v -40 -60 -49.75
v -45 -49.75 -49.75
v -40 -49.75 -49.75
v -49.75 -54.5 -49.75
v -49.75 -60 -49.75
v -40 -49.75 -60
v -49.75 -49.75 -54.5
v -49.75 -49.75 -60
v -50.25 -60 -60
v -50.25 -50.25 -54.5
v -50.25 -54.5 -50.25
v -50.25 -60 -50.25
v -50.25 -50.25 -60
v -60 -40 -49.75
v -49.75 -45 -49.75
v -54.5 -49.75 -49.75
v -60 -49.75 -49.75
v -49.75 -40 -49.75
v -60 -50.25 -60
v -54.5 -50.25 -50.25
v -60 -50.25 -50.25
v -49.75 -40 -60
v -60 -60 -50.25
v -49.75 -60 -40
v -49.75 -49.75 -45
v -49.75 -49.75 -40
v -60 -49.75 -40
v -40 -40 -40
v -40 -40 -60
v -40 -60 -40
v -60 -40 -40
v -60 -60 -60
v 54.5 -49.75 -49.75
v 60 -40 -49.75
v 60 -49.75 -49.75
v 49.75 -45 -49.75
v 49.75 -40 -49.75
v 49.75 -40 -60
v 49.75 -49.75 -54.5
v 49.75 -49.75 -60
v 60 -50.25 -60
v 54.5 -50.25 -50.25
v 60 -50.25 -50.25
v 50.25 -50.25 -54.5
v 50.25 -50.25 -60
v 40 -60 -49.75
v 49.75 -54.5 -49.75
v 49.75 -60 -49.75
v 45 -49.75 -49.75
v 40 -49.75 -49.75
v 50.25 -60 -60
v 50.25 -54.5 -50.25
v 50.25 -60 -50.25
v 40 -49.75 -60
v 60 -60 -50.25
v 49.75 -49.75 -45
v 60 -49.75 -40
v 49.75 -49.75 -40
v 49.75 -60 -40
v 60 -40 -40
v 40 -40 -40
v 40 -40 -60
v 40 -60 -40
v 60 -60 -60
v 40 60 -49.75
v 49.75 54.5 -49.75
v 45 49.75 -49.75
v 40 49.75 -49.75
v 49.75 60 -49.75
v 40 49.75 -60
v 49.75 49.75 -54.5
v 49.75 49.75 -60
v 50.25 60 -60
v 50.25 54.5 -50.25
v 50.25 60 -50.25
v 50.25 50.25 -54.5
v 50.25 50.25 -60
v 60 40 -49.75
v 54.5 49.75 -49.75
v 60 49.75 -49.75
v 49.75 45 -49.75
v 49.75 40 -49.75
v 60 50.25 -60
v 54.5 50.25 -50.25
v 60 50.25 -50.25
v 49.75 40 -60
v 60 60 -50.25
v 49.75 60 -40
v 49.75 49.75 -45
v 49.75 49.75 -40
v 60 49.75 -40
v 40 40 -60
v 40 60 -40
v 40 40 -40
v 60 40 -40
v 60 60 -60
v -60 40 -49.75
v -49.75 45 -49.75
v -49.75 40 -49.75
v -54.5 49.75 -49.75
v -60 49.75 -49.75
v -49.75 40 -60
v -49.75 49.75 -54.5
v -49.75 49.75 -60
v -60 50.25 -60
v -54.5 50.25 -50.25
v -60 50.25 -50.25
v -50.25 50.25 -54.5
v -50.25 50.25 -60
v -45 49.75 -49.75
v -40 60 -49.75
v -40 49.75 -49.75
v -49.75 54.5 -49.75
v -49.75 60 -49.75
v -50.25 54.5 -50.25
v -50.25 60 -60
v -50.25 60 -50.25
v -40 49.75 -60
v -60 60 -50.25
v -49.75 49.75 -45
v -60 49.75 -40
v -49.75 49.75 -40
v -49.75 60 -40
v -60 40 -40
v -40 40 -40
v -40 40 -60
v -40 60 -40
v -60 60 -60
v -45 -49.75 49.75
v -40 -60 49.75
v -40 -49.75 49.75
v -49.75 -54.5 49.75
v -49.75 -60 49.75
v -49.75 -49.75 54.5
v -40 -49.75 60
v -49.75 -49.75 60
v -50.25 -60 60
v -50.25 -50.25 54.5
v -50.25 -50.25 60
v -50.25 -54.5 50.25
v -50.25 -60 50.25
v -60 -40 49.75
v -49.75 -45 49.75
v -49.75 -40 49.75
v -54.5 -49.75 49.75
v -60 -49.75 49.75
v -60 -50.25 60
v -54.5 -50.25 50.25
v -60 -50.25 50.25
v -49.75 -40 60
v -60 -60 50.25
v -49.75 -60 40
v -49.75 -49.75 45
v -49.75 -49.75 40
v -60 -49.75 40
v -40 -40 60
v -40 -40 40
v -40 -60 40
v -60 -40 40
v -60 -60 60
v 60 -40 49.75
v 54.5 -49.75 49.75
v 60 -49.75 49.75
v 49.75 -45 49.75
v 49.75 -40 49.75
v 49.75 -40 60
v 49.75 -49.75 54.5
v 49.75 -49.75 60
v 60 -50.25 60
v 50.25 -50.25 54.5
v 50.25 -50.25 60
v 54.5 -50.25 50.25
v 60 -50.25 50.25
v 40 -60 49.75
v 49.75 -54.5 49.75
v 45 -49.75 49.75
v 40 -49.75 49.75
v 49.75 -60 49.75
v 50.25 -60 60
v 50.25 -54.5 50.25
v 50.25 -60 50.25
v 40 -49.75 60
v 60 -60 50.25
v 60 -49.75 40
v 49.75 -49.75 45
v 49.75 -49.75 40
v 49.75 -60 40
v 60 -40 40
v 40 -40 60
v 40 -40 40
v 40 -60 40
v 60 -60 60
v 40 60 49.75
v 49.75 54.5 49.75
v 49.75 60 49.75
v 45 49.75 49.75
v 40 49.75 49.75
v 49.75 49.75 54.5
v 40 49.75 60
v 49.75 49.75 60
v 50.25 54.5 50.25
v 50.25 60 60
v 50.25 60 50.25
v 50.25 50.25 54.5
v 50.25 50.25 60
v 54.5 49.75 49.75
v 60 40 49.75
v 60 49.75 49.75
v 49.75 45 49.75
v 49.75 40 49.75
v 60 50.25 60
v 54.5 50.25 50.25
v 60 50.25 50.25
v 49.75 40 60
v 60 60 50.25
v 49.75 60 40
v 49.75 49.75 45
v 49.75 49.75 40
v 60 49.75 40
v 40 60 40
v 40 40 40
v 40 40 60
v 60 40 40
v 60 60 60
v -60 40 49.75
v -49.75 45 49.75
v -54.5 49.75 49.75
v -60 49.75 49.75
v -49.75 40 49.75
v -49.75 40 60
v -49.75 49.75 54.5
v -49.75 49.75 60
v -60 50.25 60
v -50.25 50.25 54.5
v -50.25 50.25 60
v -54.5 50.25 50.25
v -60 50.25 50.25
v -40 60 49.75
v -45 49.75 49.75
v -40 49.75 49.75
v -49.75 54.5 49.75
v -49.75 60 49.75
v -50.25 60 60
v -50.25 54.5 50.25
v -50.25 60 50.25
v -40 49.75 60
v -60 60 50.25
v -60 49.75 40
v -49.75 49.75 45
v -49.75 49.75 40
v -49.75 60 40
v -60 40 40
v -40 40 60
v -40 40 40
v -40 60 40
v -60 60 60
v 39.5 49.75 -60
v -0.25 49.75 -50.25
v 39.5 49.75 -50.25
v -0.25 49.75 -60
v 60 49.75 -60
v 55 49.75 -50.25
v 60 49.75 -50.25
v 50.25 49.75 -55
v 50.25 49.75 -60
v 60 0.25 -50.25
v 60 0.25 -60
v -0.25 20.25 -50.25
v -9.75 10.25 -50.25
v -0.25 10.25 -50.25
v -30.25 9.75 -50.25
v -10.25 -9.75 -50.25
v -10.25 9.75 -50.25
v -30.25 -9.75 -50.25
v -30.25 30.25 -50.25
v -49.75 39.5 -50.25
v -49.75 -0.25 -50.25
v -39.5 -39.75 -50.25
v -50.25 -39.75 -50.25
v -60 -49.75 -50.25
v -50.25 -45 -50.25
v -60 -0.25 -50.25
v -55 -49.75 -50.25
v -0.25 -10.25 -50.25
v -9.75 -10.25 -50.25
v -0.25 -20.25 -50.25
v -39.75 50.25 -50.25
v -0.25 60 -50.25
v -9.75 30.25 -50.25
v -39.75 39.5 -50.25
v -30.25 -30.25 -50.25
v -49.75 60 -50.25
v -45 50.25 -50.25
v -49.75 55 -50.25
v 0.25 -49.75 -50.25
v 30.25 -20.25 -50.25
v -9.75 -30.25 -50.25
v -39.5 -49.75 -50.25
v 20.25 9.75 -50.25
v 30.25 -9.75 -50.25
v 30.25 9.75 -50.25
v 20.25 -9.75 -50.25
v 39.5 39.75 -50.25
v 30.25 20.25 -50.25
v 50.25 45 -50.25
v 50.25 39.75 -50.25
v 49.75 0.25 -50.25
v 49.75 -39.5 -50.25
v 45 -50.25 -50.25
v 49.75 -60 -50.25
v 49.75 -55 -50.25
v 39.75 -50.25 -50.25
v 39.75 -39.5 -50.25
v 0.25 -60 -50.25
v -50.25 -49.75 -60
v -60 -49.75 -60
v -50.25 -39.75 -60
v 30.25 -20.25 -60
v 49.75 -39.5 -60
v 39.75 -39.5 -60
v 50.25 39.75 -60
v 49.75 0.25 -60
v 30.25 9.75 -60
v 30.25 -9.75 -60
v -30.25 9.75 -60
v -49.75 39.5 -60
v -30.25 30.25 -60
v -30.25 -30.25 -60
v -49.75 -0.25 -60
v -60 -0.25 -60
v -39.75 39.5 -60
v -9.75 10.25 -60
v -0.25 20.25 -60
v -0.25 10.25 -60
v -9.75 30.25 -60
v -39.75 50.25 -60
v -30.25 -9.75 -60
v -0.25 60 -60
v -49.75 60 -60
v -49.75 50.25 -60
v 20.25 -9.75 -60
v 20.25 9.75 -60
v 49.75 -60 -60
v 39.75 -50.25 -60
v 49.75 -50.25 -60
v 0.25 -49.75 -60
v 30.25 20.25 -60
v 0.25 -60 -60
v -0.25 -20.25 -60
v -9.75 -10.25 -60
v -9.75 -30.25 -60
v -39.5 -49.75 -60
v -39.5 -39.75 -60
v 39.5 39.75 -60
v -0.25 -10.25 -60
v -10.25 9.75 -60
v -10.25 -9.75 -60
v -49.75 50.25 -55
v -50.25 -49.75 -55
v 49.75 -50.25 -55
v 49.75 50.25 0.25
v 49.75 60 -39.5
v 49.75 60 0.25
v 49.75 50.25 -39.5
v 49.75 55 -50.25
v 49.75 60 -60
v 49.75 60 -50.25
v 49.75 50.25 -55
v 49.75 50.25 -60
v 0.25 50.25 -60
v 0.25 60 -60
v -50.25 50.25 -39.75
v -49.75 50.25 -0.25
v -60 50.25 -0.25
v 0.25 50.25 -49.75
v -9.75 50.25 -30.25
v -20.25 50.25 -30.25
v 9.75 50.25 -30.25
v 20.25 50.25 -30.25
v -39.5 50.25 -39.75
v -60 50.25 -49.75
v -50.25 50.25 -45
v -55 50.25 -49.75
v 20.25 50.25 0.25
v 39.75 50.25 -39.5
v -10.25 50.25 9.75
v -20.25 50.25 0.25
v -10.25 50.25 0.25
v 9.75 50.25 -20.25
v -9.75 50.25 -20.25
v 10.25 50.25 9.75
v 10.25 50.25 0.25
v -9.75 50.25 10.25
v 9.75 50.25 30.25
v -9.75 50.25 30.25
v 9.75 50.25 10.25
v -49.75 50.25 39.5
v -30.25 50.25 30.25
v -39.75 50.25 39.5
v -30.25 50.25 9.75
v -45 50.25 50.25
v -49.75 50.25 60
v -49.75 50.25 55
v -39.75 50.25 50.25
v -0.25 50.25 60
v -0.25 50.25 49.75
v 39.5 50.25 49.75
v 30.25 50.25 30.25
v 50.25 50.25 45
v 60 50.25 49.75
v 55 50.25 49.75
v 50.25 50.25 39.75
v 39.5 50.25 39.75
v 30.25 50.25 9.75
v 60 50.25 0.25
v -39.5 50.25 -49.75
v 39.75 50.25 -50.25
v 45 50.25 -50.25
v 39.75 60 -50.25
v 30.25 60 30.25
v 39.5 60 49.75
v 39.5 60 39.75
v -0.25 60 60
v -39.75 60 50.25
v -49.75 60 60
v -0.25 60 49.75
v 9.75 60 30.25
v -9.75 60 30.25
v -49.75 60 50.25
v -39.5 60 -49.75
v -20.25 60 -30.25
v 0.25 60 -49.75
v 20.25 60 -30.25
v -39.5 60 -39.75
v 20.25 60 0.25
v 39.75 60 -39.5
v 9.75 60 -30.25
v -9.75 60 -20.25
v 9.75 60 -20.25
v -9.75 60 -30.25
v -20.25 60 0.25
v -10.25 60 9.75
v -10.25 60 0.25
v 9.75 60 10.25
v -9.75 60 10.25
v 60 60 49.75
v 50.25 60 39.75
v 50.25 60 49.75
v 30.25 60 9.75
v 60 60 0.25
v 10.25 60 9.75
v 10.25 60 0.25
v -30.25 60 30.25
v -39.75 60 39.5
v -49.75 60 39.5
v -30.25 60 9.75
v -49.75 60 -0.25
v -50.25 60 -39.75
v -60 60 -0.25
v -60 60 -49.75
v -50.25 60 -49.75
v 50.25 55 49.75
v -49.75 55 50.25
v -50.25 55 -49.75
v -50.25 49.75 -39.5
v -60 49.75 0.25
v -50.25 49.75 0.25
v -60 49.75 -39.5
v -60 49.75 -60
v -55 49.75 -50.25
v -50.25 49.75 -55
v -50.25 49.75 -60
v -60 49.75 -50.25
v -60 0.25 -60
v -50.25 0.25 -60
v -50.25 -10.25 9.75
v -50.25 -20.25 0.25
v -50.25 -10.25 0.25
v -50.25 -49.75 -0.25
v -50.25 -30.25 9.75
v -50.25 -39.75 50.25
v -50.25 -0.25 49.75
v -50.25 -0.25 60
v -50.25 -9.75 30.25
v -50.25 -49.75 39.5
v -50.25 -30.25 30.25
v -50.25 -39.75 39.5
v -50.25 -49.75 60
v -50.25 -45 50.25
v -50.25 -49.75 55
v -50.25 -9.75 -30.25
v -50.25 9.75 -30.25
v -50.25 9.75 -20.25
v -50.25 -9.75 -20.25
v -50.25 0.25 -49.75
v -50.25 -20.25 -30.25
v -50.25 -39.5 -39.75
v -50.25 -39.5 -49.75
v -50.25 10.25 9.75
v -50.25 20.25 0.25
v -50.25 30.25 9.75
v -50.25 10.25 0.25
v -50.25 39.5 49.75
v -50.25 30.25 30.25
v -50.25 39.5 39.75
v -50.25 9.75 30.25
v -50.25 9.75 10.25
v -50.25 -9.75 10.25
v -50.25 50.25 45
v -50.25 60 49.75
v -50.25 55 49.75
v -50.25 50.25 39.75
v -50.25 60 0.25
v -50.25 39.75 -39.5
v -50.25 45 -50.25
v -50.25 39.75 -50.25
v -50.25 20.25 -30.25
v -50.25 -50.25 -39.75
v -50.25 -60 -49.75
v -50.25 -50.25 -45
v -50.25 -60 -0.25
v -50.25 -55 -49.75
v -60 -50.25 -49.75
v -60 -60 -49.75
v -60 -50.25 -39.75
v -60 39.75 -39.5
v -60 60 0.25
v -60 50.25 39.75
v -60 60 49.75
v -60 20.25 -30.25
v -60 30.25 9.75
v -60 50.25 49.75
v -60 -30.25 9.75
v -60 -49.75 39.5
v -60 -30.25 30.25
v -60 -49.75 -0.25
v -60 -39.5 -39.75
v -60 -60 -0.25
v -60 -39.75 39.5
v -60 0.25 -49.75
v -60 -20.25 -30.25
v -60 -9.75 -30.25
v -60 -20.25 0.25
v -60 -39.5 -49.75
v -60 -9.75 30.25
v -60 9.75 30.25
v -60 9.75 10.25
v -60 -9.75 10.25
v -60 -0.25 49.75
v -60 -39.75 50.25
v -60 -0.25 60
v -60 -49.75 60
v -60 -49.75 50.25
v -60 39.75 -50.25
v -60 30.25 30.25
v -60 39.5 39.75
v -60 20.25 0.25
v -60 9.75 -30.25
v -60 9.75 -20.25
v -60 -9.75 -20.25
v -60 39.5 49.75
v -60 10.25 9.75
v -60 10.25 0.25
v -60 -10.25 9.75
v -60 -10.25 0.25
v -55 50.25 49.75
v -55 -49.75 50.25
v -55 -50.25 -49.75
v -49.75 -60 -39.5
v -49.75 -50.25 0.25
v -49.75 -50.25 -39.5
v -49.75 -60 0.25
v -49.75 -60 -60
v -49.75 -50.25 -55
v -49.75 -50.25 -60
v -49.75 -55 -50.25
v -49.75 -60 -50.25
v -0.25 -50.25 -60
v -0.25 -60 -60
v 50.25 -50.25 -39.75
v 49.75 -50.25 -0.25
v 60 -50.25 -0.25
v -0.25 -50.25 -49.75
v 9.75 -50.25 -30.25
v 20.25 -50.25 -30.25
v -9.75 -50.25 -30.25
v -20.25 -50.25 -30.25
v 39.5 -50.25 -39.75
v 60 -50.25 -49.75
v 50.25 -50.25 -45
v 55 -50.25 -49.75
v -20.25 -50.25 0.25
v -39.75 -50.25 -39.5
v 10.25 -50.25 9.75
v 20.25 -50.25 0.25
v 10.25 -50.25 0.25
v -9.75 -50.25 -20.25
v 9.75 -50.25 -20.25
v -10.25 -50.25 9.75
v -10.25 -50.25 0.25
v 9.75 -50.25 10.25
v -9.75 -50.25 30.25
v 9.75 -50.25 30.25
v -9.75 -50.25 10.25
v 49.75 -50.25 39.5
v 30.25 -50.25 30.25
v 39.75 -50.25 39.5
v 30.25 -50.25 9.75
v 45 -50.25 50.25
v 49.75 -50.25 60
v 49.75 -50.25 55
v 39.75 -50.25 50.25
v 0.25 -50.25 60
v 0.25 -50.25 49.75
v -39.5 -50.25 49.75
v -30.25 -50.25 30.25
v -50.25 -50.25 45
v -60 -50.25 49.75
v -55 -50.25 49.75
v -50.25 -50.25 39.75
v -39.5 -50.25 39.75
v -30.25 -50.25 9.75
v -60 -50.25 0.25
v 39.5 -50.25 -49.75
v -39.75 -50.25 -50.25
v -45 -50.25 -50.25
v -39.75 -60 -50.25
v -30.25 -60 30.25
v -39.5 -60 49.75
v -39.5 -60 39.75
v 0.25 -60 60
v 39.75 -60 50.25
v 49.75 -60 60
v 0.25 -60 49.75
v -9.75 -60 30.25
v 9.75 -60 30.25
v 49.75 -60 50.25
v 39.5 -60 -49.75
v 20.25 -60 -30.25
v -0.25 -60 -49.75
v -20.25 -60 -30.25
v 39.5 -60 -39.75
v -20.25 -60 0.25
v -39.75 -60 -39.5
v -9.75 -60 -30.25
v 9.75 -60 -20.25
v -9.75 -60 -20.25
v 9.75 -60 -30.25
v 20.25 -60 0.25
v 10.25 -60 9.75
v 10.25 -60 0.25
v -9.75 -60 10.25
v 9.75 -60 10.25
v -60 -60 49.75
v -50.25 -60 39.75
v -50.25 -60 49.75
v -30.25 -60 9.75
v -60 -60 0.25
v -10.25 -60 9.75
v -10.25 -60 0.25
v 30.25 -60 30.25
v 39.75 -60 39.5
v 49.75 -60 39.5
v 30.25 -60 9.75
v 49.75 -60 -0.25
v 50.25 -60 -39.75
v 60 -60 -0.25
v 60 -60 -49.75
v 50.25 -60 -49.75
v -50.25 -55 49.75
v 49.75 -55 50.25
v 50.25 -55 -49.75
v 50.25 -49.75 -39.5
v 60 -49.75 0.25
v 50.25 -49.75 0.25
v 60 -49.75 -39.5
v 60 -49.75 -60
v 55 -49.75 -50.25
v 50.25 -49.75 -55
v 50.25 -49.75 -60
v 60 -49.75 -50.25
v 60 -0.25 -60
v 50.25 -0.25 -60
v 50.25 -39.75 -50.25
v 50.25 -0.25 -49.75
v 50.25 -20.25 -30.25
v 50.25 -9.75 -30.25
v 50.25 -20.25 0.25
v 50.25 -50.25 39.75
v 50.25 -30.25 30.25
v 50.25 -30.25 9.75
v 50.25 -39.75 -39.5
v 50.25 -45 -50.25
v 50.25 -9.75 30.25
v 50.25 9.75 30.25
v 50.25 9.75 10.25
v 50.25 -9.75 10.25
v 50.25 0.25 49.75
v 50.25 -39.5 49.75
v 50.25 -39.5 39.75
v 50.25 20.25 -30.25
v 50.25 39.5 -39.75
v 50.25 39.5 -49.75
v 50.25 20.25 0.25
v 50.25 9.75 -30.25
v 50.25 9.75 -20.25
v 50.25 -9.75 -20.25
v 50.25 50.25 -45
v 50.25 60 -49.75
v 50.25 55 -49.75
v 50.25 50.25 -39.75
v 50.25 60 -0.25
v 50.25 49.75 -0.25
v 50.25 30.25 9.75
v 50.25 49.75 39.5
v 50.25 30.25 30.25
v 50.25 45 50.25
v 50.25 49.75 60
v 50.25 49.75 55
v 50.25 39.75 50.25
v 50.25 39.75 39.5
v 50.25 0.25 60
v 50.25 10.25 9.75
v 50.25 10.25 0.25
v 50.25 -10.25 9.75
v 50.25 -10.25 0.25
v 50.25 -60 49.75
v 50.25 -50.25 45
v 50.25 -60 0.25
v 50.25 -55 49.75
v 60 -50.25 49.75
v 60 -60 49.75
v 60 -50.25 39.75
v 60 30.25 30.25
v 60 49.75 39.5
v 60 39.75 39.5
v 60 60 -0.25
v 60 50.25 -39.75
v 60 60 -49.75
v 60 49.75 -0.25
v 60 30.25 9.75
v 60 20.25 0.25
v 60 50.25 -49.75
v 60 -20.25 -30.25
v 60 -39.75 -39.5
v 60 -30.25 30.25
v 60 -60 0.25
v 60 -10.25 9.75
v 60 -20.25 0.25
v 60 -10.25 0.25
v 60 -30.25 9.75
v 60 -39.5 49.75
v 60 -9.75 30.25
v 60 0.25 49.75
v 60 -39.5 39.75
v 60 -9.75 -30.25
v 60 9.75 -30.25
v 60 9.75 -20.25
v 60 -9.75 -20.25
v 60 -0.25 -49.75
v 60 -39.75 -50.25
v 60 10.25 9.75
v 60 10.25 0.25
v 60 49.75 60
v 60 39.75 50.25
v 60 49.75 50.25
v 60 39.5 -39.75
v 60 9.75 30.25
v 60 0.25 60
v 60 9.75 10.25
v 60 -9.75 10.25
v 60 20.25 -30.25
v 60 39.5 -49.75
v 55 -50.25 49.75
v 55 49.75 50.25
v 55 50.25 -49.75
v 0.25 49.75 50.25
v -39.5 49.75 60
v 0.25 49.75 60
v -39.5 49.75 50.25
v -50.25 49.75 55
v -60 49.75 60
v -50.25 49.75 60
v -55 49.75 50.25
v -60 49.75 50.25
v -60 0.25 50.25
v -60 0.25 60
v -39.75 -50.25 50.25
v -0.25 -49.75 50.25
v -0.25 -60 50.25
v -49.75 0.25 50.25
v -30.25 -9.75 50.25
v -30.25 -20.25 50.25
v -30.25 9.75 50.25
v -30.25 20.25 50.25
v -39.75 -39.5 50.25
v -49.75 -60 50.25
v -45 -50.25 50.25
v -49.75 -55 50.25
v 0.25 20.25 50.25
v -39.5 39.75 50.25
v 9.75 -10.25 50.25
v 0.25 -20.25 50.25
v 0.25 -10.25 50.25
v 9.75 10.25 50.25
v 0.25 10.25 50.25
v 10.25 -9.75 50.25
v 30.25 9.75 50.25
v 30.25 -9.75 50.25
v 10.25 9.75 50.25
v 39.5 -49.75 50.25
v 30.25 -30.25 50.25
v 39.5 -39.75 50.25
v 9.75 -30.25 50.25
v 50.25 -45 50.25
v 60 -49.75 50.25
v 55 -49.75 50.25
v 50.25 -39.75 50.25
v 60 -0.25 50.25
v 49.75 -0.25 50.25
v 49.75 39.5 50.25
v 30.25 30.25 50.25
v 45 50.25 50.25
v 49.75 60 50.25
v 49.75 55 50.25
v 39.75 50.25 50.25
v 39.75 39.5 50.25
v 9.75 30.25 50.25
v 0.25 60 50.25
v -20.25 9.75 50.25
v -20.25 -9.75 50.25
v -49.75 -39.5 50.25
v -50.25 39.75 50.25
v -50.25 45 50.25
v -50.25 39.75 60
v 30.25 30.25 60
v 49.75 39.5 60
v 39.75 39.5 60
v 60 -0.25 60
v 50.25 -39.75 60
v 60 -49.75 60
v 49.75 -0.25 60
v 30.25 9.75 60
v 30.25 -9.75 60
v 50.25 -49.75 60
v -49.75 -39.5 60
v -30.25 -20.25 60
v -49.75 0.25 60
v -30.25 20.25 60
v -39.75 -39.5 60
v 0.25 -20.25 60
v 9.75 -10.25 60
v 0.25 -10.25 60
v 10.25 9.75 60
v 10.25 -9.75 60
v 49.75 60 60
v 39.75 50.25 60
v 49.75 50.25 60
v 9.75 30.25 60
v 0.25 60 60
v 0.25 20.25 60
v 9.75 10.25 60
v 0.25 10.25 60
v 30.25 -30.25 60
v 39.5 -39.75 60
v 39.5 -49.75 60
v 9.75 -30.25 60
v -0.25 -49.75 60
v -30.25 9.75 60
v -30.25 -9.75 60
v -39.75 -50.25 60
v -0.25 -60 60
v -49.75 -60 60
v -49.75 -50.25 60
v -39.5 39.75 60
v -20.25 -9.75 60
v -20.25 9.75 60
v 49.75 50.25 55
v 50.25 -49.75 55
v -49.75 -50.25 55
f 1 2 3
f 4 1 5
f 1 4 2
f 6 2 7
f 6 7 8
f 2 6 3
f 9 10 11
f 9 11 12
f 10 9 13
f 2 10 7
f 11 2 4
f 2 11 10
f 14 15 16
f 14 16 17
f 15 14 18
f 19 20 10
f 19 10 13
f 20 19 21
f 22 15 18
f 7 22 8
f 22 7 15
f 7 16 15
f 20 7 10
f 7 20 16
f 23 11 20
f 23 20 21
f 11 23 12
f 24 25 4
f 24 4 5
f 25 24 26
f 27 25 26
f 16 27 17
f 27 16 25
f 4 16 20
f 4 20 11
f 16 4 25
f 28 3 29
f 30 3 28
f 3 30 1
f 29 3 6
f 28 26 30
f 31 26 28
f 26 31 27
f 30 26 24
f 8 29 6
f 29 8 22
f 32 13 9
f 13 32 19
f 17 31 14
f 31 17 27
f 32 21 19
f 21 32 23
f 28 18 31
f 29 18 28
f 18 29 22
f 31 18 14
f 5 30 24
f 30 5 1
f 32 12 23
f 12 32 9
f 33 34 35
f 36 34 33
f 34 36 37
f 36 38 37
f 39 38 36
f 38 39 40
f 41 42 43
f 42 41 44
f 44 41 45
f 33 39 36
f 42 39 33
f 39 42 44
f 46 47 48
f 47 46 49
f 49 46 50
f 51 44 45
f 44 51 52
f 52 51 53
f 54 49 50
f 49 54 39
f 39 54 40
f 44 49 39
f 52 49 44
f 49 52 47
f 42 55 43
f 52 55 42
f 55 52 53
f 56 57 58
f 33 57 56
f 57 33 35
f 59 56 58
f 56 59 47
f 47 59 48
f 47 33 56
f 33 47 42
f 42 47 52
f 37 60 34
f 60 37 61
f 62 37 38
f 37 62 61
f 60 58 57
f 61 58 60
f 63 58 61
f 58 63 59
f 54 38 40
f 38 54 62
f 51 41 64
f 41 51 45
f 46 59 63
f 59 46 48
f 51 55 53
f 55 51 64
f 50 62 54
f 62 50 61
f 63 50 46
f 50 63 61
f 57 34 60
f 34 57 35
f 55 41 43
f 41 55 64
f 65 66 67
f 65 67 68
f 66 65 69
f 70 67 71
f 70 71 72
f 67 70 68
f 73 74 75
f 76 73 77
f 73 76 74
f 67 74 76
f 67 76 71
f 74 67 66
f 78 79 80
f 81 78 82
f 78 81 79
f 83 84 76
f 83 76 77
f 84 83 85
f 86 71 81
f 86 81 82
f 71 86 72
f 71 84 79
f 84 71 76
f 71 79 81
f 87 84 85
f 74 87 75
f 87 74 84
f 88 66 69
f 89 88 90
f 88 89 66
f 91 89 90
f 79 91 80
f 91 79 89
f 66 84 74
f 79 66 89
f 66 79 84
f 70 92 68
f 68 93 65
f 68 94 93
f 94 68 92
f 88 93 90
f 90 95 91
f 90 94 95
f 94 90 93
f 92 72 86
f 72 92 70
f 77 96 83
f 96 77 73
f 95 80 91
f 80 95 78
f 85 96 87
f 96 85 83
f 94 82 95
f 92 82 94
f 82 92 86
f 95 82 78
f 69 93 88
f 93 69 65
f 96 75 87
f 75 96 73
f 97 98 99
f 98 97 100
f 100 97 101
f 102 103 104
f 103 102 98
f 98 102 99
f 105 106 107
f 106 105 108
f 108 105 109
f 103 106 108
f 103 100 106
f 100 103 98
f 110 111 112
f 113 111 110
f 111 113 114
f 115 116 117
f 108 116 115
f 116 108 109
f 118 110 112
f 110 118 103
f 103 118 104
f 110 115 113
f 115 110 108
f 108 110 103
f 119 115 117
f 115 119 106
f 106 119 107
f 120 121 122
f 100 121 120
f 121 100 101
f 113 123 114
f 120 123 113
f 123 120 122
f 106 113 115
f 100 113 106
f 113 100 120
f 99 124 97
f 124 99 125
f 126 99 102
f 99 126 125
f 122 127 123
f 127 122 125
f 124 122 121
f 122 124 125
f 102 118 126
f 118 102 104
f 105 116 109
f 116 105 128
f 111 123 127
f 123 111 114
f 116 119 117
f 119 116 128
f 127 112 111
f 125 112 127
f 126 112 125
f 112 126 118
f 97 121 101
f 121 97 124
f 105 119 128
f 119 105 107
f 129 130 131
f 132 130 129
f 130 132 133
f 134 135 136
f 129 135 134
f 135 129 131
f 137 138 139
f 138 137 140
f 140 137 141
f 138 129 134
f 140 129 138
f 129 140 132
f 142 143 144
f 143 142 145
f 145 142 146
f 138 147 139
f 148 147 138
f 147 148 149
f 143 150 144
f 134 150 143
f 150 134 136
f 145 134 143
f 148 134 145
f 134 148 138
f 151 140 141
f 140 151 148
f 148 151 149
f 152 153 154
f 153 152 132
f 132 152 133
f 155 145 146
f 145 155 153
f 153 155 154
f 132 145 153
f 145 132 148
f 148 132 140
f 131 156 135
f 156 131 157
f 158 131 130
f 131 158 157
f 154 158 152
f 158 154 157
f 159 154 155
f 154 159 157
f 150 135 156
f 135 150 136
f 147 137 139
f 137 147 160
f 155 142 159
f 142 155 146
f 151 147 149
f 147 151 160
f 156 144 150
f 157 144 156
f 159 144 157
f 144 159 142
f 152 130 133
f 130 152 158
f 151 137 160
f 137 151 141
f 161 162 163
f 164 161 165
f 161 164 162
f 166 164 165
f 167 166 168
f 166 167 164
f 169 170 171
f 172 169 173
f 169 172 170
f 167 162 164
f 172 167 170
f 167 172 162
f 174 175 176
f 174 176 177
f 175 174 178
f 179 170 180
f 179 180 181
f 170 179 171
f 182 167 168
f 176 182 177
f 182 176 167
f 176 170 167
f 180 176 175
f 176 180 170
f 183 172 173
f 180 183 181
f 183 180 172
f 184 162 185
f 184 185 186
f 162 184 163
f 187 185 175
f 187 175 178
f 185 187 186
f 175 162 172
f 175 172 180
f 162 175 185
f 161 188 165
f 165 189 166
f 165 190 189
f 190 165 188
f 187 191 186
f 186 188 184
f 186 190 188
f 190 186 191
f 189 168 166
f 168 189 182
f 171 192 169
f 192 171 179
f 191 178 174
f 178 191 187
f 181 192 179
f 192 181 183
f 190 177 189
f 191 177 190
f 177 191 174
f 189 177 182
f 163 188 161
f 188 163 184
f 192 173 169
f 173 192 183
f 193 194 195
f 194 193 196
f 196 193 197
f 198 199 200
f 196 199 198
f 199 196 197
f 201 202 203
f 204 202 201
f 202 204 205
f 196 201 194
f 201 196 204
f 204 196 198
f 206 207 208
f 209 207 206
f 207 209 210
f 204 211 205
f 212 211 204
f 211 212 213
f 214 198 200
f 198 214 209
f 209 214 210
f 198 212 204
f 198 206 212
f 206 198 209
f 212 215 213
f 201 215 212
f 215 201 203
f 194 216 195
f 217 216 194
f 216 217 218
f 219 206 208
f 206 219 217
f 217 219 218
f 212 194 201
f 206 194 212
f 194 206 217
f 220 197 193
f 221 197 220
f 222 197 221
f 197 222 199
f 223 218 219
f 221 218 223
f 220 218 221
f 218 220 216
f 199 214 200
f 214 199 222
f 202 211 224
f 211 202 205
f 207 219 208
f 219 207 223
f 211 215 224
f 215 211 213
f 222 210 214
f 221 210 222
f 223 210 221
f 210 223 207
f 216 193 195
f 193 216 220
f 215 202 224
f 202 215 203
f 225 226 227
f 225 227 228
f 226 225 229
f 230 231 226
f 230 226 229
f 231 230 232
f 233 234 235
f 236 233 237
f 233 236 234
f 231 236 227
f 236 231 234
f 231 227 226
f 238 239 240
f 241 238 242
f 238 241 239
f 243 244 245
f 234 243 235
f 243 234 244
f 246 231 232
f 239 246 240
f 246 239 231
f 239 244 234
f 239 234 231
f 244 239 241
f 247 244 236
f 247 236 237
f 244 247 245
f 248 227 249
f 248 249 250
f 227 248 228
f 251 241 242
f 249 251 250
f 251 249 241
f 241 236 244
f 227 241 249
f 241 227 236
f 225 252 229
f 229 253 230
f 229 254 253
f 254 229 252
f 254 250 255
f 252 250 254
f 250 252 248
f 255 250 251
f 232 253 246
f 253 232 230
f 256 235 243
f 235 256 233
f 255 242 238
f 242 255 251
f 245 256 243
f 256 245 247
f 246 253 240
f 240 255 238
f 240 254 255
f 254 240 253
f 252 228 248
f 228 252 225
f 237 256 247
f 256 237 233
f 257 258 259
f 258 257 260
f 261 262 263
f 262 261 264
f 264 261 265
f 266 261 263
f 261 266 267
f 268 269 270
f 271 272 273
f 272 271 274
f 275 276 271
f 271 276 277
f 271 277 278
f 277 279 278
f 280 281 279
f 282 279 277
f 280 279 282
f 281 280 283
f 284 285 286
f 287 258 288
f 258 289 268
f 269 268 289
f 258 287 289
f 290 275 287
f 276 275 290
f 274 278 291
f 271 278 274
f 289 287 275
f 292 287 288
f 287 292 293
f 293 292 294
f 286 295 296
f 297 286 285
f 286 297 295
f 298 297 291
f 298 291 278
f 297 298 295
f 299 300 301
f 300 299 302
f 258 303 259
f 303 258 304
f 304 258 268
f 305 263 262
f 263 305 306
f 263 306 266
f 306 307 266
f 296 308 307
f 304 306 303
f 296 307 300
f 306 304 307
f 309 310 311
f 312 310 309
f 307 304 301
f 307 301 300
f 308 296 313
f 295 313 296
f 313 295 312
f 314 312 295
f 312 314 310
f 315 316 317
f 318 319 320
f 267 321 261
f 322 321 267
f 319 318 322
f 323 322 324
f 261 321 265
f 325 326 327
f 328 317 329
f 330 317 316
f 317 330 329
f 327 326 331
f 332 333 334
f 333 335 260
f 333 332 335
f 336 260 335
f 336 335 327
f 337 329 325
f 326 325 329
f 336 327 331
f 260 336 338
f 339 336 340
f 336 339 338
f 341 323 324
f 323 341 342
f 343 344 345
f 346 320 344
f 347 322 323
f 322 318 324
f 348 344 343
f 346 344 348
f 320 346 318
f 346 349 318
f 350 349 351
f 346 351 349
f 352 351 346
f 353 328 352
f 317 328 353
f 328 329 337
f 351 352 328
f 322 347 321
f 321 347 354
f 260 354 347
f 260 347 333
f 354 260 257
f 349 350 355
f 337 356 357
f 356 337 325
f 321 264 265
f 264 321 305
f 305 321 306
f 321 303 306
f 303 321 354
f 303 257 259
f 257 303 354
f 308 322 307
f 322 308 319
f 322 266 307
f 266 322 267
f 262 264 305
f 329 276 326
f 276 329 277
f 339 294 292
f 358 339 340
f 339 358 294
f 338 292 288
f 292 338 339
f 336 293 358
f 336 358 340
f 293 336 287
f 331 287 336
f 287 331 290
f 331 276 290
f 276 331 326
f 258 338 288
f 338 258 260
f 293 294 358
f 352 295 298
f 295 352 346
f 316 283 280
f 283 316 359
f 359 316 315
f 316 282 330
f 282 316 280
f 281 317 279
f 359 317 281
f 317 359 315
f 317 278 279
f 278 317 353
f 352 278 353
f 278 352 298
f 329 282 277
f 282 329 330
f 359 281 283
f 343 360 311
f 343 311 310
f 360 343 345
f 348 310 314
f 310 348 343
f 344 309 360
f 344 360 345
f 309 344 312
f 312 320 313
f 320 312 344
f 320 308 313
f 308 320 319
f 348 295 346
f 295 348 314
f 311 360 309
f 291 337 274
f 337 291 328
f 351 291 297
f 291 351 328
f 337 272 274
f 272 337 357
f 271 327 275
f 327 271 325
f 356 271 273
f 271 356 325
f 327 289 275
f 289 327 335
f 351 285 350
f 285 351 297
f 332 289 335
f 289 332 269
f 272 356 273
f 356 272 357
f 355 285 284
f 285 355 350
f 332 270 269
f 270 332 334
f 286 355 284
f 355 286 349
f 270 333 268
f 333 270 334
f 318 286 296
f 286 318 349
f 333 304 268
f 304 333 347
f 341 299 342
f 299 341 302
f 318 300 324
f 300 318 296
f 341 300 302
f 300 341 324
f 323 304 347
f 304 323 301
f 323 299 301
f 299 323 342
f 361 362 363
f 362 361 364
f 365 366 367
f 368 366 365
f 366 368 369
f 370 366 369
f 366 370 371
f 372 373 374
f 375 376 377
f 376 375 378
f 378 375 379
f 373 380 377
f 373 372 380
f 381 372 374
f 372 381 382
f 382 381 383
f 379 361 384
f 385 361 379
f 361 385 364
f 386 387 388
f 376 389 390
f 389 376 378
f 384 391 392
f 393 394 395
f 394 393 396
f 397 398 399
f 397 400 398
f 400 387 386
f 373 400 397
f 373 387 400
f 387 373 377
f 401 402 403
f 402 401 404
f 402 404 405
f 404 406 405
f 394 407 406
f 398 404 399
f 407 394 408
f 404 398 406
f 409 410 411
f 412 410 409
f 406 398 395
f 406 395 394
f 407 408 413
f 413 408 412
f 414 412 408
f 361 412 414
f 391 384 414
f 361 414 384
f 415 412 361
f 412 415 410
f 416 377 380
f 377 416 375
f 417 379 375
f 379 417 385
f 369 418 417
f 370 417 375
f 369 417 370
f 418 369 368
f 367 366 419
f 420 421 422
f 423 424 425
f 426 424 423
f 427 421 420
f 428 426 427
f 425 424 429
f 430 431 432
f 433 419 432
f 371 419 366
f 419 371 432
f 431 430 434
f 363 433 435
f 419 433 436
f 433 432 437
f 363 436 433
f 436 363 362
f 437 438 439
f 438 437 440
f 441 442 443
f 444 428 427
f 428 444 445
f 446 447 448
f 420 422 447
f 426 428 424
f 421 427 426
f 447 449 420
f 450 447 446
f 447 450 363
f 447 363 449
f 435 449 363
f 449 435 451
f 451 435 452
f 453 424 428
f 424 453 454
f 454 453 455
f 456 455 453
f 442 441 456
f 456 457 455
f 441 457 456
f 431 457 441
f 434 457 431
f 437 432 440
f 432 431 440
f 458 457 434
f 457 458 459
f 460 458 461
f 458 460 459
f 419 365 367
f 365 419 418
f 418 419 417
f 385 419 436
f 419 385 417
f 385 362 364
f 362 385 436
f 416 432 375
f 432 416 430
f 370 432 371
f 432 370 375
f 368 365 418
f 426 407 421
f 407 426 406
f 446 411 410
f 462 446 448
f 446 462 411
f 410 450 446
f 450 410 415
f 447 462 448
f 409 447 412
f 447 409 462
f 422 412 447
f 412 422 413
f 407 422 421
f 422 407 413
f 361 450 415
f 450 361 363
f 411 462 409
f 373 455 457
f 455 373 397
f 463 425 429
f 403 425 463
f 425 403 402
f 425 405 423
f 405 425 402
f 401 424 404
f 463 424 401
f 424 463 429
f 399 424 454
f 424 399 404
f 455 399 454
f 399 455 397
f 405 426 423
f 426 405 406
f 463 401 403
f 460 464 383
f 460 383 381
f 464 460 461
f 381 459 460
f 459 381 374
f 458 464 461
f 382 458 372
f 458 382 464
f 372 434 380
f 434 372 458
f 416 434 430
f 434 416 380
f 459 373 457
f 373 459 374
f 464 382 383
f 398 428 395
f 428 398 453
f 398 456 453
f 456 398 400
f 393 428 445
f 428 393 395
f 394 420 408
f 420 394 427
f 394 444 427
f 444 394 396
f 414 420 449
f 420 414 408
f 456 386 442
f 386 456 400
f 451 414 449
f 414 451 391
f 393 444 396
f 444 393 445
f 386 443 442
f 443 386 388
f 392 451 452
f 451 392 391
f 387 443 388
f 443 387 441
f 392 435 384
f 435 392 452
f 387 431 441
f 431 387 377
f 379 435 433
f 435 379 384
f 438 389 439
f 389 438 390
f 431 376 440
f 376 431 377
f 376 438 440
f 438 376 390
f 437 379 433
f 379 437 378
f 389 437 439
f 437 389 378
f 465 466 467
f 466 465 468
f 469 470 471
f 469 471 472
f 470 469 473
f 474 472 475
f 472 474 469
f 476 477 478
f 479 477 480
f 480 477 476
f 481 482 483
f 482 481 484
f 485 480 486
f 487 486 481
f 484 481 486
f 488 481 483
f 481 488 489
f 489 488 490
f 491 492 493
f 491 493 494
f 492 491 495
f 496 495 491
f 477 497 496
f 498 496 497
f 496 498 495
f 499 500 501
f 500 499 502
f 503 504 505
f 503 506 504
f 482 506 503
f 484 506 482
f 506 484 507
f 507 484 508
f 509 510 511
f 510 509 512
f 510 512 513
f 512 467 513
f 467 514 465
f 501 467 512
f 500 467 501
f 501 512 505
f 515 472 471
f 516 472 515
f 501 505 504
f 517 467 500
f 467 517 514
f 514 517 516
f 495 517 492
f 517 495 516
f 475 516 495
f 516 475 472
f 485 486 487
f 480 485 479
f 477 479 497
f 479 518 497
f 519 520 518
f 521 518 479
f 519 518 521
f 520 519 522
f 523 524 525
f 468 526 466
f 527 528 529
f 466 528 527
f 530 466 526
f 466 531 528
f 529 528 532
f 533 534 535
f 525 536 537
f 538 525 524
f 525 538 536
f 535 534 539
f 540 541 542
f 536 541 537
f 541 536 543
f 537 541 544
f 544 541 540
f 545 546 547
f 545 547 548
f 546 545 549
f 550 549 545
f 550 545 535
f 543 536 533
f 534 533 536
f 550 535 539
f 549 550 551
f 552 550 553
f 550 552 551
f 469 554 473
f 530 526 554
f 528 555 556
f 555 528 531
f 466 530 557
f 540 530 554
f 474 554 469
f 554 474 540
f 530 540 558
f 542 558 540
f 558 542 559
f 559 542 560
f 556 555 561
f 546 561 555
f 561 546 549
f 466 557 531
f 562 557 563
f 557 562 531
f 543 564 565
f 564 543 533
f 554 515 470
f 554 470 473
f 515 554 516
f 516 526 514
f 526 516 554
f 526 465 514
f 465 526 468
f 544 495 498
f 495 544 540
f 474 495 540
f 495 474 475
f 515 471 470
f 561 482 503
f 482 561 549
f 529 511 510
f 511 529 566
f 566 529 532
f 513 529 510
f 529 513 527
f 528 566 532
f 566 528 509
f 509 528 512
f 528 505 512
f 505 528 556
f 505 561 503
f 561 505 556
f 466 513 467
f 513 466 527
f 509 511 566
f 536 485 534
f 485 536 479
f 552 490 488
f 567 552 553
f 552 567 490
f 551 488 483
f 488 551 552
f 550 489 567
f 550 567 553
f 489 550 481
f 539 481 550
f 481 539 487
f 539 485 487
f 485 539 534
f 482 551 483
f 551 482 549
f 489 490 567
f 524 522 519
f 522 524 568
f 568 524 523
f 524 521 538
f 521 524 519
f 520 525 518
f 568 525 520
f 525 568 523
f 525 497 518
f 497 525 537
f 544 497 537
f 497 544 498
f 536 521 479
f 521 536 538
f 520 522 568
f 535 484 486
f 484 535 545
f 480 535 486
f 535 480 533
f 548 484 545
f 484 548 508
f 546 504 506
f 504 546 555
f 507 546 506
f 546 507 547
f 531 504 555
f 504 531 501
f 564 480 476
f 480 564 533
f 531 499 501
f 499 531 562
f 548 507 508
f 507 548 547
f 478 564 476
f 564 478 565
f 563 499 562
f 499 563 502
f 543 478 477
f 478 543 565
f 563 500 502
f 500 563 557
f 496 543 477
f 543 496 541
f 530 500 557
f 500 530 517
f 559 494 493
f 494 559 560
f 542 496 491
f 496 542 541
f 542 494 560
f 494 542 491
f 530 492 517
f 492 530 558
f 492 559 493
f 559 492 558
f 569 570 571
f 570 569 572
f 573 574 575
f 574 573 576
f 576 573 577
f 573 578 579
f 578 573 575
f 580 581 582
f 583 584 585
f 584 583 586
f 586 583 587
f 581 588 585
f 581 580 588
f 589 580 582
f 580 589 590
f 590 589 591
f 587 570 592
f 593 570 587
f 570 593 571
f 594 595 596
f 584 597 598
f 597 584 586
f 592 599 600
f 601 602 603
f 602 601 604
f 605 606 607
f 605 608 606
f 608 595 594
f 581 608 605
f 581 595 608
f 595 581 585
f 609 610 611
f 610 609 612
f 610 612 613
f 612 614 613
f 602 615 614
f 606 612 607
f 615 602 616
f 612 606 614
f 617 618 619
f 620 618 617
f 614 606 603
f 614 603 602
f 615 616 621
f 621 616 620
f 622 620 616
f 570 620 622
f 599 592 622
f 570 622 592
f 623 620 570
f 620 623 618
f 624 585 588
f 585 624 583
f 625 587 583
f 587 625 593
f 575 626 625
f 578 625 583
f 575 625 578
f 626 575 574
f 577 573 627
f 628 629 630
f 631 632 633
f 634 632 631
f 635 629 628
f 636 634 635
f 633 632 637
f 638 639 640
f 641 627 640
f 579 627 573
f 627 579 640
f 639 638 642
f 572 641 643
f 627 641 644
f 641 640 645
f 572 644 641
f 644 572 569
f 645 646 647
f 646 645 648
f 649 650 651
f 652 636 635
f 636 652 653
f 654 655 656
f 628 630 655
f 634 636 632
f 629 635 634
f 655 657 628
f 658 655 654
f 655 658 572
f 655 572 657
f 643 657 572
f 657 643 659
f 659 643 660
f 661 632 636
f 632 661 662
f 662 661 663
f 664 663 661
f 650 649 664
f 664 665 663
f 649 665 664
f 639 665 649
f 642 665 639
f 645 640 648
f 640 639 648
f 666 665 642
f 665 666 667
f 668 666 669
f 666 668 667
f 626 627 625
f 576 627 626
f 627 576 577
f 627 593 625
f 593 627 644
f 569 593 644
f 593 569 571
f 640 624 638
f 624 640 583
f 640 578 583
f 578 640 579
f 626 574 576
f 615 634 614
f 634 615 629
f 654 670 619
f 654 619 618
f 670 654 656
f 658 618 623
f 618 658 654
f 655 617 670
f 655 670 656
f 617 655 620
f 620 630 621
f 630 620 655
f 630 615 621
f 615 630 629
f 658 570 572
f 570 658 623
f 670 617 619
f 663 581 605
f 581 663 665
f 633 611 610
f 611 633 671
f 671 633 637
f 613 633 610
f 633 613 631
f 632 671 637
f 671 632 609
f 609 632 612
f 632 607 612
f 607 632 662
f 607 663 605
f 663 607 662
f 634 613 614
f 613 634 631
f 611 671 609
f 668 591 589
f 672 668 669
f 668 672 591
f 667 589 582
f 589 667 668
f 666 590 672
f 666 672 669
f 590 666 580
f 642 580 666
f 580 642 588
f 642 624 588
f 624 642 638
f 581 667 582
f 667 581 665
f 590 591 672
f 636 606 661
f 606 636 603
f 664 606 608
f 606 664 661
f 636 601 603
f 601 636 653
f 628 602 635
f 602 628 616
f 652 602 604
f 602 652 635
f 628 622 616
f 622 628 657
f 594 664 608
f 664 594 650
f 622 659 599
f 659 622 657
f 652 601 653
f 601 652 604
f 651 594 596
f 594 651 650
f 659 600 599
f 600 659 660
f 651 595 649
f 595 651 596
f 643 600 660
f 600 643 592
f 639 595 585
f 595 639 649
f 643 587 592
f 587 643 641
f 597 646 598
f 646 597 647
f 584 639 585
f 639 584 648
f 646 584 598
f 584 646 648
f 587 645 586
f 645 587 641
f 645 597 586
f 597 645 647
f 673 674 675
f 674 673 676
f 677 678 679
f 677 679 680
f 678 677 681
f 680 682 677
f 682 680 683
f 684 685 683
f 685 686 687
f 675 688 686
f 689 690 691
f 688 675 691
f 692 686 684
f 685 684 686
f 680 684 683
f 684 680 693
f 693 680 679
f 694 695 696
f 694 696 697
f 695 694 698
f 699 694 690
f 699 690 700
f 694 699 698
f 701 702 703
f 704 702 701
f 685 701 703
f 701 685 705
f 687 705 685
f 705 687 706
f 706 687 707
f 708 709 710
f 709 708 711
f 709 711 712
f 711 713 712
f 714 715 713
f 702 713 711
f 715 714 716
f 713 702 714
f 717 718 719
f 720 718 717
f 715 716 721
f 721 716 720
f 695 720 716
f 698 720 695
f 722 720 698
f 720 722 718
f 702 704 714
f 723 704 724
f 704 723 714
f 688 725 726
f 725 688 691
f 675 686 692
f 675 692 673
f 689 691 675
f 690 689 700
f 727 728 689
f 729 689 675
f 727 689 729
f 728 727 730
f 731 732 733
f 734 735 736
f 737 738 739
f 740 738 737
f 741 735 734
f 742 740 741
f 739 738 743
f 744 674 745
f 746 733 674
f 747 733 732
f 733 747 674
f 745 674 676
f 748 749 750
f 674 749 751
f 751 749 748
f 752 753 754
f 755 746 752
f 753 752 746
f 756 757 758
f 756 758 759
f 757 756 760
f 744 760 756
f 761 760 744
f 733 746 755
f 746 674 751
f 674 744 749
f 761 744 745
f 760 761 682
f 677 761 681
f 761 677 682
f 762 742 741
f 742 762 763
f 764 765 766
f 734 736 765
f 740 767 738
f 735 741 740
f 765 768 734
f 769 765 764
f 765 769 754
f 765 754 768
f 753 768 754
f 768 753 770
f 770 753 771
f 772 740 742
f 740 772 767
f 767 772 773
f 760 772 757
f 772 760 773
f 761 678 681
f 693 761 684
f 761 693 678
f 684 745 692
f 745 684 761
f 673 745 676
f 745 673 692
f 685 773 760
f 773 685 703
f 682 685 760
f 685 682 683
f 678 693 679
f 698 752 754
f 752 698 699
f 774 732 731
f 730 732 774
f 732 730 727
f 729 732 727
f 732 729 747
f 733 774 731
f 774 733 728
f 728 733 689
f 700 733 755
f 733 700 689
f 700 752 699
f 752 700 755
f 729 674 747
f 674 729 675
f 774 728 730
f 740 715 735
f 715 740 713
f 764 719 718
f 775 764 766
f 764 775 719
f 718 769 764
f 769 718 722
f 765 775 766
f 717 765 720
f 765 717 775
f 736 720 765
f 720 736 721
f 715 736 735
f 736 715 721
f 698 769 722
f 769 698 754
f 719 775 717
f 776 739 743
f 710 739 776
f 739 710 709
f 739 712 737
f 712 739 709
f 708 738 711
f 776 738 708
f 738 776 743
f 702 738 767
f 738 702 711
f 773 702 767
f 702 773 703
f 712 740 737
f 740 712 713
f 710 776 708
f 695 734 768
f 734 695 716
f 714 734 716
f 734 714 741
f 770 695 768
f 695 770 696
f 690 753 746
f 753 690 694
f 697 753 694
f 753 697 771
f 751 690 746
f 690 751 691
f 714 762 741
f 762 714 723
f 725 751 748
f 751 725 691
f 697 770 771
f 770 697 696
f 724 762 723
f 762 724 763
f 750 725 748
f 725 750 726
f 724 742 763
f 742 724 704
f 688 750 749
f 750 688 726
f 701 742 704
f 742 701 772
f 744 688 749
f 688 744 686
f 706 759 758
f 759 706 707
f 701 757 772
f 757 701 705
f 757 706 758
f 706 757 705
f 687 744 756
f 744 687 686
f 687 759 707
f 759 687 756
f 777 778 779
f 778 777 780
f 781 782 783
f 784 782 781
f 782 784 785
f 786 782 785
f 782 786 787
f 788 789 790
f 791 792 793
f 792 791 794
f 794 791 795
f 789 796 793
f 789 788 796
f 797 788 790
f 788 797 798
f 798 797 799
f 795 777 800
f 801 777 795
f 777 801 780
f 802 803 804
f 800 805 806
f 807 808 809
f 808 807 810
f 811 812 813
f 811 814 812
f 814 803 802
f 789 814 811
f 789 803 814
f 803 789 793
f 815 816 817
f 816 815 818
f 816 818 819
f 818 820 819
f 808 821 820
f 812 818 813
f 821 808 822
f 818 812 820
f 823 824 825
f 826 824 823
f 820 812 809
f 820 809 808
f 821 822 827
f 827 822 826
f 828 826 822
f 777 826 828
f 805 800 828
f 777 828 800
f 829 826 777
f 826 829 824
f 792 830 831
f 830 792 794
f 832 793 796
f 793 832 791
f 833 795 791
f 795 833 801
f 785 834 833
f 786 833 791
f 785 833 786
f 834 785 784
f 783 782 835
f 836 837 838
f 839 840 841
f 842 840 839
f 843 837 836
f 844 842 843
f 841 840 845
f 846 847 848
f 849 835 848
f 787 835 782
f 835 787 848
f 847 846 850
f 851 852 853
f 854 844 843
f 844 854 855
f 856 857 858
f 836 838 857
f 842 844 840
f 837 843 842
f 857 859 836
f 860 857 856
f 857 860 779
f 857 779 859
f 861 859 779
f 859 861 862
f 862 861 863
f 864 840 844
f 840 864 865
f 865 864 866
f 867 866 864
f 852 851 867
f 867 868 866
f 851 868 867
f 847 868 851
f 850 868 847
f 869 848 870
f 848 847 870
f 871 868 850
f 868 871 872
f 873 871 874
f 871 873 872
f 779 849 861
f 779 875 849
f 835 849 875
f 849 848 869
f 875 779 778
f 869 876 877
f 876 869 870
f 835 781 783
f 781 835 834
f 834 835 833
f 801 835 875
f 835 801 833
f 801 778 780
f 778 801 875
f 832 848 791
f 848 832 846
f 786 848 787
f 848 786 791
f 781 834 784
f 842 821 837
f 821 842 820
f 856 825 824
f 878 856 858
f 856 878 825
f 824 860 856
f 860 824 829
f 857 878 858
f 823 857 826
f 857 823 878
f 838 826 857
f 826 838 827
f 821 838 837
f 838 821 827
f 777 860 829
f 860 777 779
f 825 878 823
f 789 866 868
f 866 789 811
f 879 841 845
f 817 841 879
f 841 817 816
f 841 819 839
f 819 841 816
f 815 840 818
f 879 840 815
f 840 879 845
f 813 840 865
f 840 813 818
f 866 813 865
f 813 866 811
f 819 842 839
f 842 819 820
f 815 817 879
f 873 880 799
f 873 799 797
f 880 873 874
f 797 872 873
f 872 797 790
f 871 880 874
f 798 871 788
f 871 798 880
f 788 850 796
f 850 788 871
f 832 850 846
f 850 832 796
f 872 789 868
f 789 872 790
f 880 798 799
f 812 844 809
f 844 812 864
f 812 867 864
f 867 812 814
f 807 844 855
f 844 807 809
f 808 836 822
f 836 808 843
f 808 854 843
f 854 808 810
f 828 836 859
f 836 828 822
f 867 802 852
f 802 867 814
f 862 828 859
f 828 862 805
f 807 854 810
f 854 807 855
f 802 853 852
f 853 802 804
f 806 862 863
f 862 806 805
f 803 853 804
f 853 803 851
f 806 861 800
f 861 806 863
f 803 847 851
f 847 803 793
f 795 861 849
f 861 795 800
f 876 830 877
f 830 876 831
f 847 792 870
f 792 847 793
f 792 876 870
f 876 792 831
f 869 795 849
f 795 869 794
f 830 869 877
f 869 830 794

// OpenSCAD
// file: util.scad
// Used by top ring to build its three solids

//chanfered_ring();
//chanfered_box();
//pipe(ir1=100, ir2=90, t=10, h=30, $fn=120);
//pipe(ir=100, t=10, h=30, $fn=120);
//chanfered_profile(c4=[2,3]);
//chanfered_cylinder(ir=40, h=40, taper_bottom=-5, c4=[2,2], $fn=120);
//cylinder(r=10,h=40);
//chanfered_cylinder(h=40, t=20, c3=[2,2], center=false, $fn=120);
//beveled_cube(size=[30,30,5], radius=5, chanfer=[1,1], $fn=120);

chanfer=1;
chanfer_angle=4;
bottom_chanfer_scale=4;
m=25.4;

//Used by chanfered_cylinder
module chanfered_profile(x=10, dx_top=0, dx_bottom=0, y=20, c1=[0,0], c2=[0,0], c3=[0,0], c4=[0,0]) {
  polygon(points=[
    [dx_bottom+0+c1[0],0],
    [dx_bottom+x-c2[0],0],
    [dx_bottom+x,c2[1]],
    [dx_top+x,y-c3[1]],
    [dx_top+x-c3[0],y],
    [dx_top+0+c4[0],y],
    [dx_top+0,y-c4[1]],
    [dx_bottom+0,c1[1]],
  ]);
}

module chanfered_cylinder(ir=0, taper_top=0, taper_bottom=0, t=10, h=20, c1=[0,0], c2=[0,0], c3=[0,0], c4=[0,0], center=false) {
  translate([0,0,center ? -h/2 : 0])
    rotate_extrude()
      translate([ir,0,0])
        chanfered_profile(x=t, dx_top=taper_top, dx_bottom=taper_bottom, y=h, c1=c1, c2=c2, c3=c3, c4=c4);
}

module profile(w, h, c=chanfer, a=chanfer_angle) {
  polygon(points=[
    [0,0],
    [w-bottom_chanfer_scale*c,0],
    [w,bottom_chanfer_scale*(c+a)],
    [w,h-c],
    [w-c,h],
    [0,h],
  ]);
}

module chanfered_ring(ir=0, w=10, h=20, c=chanfer) {
  rotate_extrude()
    translate([ir,0,0])
      profile(w=w, h=h, c=c);
}

module chanfered_box(l=30, w=10, h=20, c=chanfer) {
  linear_extrude(height=l) {
    profile(w=w/2, h=h, c=c);
    mirror([1,0,0])
    profile(w=w/2, h=h, c=c);
  }
}

//For now centered
//Duplicates hollow_cylinder
module pipe(ir, ir1, ir2, t, h) {
  difference() {
    cylinder(r=ir+t, r1=ir1+t, r2=ir2+t, h=h, center=true);
    cylinder(r=ir, r1=ir1, r2=ir2, h=h+.01, center=true);
  }
}


// Defaults to 6-32 1/2 inch
//First print of terminal cup: module screw_hole(r_shaft=1.8, l_shaft=.5*m, r_head=3.4, l_head=10) {
//TODO shaft radius wants to be small for diffencing holes in other part yet large for this part.
module screw_hole(r_shaft=1.8, l_shaft=.5*m, r_head=3.8, l_head=10) {
  cylinder(r=r_head, l_head);
  translate([0,0,-l_shaft])
    cylinder(r=r_shaft, l_shaft+.01);
}

// Move to basic geometry library
// Duplicates code in plumbing library
module hollow_cylinder(ir, t, h) {
  difference() {
    cylinder(r=ir+t, h=h, center=true);
    cylinder(r=ir, h=h+2, center=true);
  }
}

// Move to util library
module radial_section_of(d=1000, angle=90) {
  difference() {
    children(0);
    union() {
      rotate([0,0,90-angle/2]) translate([-d/2,0,0]) cube(size=[d,d,d], center=true);
      rotate([0,0,-90+angle/2]) translate([-d/2,0,0]) cube(size=[d,d,d], center=true);
    }
  }
}

module radial_array(n=4, r=0) {
  for(rz=[0:360/n:359]) {
    rotate([0,0,rz])
        translate([r,0,0])
            children(0);
  }
}

module prism(sides=4, height=10, r=20, corner_radius=5, c2=[0,0], c3=[0,0]) {
  translate([0,0,height/2])
    minkowski() {
      cylinder(
        r=r,
        h=.0001,
        center=true,
        $fn=sides
      );
     chanfered_cylinder(t=corner_radius, h=height, c2=c2, c3=c3, center=true); 
    }
}
// main file
include <util.scad>;

box();
//negative_corner();
//bottom();
//color("yellow") dyeChanfered();
//color("blue") corner();
//side();
//color("red") quarterSide();

voxel=10;
width=12        ;
//Printed first at .1
tol=.5;

creeper=[
  [1,1,0,0,1,1],
  [1,1,0,0,1,1],
  [0,0,1,1,0,0],
  [0,1,1,1,1,0],
  [0,1,1,1,1,0],
  [0,1,0,0,1,0]
];

random_pattern=[for([0:1:5]) rands(0,1,6)];
  
pattern=creeper;

module box() {
  corners();
  //four sides
  radial_array(n=4)
    rotate([90,90,0])
        bottom();
  bottom();
  //Top
  mirror([1,0,0])
    mirror([0,0,1])
      bottom();
 }

module corners() {
  mirror([0,0,1])
  radial_array(n=4)
    negative_corner();
  radial_array(n=4)
    negative_corner();
}

module negative_corner() {
  d=(width-1)/2*voxel;
  color("red") translate([-d,-d,-d]) corner();
}

module bottom() {
  d=(width-1)/2*voxel;
  color("blue")
    translate([0,0,-d])
      side();
}

module side() {
  punch(pattern=pattern)
  //different random pattern on each side
  //punch(pattern=[for([0:1:5]) rands(0,1,6)])
     radial_array(n=4)
      translate([voxel/2,voxel/2])
      quarterSide();
}

module corner(size=2*voxel) {
  difference() {
    translate([-voxel/2,-voxel/2,-voxel/2]) cube([size,size,size]);
    translate([voxel,0,0]) rotate(-90, [0,0,1]) mirror([0,0,1]) dyeChanfered();
    translate([0,voxel,0]) rotate(90, [0,0,1]) mirror([0,0,1]) dyeChanfered();
    translate([0,0,voxel]) rotate(180, [0,0,1]) dyeChanfered();
  }
}

module punch(pattern) {
  difference() {
    children(0);
    translate([(-len(pattern)+1)*voxel/2,(-len(pattern[0])+1)*voxel/2]) //Centered
      for(i=[0:1:len(pattern)-1]) {
        for(j=[0:1:len(pattern[i])-1]) {
          if(pattern[i][j]>.5) {
            translate([i*voxel, j*voxel])
              dye();
          }
       }
    }
  }
}

module quarterSide(size=width*voxel/2) {
  difference() {
    translate([-voxel/2,-voxel/2,-voxel/2])
      cube([size, size, voxel-tol/2]);
    //Remove row on edge
    for(x=[voxel:voxel:size]) {
      translate([size-x, size-voxel, 0]) dye();
    }    
    //Remove notch. Must be done twice offet by half the tol
    translate([size-2*voxel, size-2*voxel, 0])
      dye();
    translate([size-2*voxel-tol/2, size-2*voxel, 0])
      dye();
    
    //Small notch on edge
    translate([size-voxel, -voxel, 0])
      dye();
    
    //Chanfer corner
    rotate(-90,[0,0,1])
      mirror([0,0,1])
        translate([
          -size+1.5*voxel-tol,
          size-1.5*voxel-tol,
          -voxel/2-tol])
            chanfer();
  }
}

module dyeChanfered() {
  difference() {
    dye();
    translate([-voxel/2-2*tol,-voxel/2-tol,-voxel/2-2*tol]) chanfer();
  }
}

module dye() {
  cube([voxel+tol, voxel+tol, voxel+tol], center=true);
}

module chanfer(size=.7*voxel) {
  polyhedron(
    points=[[0,0,0], [size,0,0], [0,size,0], [0,0,size]],
    faces=[[0,3,1], [2,3,0], [0,1,2], [1,3,2]],
    convexity=2);
}
